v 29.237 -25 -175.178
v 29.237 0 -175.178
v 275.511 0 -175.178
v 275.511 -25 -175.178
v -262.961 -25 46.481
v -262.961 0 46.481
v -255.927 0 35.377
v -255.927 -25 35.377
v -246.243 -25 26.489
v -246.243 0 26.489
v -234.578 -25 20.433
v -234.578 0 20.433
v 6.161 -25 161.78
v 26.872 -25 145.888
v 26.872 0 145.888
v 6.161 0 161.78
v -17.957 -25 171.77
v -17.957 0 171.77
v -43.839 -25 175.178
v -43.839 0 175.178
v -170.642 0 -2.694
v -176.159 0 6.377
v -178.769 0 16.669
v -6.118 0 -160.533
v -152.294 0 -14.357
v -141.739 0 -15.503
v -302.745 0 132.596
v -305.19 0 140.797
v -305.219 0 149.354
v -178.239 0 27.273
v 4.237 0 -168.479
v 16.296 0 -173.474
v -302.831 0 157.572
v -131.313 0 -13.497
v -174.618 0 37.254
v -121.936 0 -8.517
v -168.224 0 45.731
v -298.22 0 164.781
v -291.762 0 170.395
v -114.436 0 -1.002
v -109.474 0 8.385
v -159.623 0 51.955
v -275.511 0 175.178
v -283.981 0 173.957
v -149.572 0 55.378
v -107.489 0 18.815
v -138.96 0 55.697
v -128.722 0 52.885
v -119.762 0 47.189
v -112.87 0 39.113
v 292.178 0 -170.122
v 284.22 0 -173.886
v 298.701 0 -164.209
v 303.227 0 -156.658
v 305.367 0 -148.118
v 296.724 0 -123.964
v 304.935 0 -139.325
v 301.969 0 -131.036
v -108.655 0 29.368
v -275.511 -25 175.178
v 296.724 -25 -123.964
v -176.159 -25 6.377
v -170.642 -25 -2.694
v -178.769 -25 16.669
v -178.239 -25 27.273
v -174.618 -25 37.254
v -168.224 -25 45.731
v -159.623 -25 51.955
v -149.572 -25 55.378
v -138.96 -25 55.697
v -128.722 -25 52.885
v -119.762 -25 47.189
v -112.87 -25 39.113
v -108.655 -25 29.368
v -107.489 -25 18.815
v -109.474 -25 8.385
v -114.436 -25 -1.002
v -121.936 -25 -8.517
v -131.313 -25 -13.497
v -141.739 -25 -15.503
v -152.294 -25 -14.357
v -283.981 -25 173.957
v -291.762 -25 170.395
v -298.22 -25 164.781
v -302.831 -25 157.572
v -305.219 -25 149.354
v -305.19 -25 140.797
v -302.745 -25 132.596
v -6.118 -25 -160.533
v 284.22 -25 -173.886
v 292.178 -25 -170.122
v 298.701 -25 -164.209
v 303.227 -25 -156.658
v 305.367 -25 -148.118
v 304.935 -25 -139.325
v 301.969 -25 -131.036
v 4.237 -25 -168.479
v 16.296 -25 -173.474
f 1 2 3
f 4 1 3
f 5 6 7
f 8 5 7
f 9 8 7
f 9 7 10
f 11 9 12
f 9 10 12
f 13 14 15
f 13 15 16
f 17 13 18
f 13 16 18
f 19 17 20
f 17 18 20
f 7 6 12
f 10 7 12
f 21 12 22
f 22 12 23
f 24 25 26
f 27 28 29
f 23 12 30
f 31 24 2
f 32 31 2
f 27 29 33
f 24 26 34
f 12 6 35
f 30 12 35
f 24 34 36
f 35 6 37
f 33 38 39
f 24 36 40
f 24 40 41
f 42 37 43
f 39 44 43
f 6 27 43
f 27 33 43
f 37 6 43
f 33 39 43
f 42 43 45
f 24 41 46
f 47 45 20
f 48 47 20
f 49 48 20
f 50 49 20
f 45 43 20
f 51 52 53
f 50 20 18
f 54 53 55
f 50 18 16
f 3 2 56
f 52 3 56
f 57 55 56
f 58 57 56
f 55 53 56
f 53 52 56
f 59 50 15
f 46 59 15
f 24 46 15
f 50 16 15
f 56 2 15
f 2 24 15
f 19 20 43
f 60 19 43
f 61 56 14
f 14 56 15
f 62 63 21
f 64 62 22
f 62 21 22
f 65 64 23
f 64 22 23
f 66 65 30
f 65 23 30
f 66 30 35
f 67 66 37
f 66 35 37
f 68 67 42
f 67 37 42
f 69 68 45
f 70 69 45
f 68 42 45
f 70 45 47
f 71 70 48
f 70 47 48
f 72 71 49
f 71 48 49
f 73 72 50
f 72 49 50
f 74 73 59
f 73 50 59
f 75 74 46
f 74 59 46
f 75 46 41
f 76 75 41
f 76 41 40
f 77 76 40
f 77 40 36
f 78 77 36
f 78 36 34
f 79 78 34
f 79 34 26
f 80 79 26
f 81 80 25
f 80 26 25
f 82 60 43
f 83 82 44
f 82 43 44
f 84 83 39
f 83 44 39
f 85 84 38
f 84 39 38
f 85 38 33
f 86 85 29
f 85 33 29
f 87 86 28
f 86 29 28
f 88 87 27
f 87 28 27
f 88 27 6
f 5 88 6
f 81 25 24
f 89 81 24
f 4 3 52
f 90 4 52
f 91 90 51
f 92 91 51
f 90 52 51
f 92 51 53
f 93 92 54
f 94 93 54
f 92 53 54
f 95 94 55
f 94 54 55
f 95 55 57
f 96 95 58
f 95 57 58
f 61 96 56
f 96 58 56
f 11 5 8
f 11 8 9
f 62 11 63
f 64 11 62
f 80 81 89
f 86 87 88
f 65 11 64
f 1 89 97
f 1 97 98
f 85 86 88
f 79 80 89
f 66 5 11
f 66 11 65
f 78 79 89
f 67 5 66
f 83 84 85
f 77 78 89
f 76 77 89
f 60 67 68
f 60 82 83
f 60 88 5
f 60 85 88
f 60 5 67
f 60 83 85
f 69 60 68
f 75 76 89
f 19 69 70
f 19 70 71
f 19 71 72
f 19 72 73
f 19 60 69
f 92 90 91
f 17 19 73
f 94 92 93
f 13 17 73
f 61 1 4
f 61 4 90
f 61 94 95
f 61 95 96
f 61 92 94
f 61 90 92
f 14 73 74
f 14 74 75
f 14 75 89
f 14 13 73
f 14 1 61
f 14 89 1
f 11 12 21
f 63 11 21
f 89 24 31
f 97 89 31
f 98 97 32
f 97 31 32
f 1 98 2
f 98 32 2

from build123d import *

# Parameters (mm, degrees)
F1_DEPTH = 25


# Not quite as in the source:
# - ends of sketch curves that miss each other by under 0.0002 mm in the source are joined


with BuildPart() as f1:
    # F0 (on Front) → F1 (new body)
    with BuildSketch(Plane.XZ):
        with BuildLine():
            ThreePointArc((-170.642238, -2.693902), (-124.029000476, 50.3717259287), (-152.294215, -14.357189))
            Line((-152.294215, -14.357189), (-6.118396, -160.533008))
            ThreePointArc((-6.118396, -160.533008), (10.1027713817, -171.3716456256), (29.236943, -175.177669))
            Line((29.236943, -175.177669), (275.511113, -175.177669))
            ThreePointArc((275.511113, -175.177669), (303.22749884, -156.6581722976), (296.7243169356, -123.9644660644))
            Line((296.7243169356, -123.9644660644), (26.871503, 145.888348))
            ThreePointArc((26.871503, 145.888348), (-5.5708317635, 167.5656232511), (-43.839175, 175.17767))
            Line((-43.839175, 175.17767), (-275.511114, 175.17767))
            ThreePointArc((-275.511114, 175.17767), (-300.7842187682, 161.3415239766), (-302.7451656672, 132.5956816918))
            Line((-302.7451656672, 132.5956816918), (-262.960739, 46.481221))
            ThreePointArc((-262.960739, 46.481221), (-251.37881686, 30.6136107366), (-234.5779690393, 20.4325748914))
            Line((-234.5779690393, 20.4325748914), (-170.642238, -2.693902))
        make_face()
    extrude(amount=F1_DEPTH)


solid = f1.part
